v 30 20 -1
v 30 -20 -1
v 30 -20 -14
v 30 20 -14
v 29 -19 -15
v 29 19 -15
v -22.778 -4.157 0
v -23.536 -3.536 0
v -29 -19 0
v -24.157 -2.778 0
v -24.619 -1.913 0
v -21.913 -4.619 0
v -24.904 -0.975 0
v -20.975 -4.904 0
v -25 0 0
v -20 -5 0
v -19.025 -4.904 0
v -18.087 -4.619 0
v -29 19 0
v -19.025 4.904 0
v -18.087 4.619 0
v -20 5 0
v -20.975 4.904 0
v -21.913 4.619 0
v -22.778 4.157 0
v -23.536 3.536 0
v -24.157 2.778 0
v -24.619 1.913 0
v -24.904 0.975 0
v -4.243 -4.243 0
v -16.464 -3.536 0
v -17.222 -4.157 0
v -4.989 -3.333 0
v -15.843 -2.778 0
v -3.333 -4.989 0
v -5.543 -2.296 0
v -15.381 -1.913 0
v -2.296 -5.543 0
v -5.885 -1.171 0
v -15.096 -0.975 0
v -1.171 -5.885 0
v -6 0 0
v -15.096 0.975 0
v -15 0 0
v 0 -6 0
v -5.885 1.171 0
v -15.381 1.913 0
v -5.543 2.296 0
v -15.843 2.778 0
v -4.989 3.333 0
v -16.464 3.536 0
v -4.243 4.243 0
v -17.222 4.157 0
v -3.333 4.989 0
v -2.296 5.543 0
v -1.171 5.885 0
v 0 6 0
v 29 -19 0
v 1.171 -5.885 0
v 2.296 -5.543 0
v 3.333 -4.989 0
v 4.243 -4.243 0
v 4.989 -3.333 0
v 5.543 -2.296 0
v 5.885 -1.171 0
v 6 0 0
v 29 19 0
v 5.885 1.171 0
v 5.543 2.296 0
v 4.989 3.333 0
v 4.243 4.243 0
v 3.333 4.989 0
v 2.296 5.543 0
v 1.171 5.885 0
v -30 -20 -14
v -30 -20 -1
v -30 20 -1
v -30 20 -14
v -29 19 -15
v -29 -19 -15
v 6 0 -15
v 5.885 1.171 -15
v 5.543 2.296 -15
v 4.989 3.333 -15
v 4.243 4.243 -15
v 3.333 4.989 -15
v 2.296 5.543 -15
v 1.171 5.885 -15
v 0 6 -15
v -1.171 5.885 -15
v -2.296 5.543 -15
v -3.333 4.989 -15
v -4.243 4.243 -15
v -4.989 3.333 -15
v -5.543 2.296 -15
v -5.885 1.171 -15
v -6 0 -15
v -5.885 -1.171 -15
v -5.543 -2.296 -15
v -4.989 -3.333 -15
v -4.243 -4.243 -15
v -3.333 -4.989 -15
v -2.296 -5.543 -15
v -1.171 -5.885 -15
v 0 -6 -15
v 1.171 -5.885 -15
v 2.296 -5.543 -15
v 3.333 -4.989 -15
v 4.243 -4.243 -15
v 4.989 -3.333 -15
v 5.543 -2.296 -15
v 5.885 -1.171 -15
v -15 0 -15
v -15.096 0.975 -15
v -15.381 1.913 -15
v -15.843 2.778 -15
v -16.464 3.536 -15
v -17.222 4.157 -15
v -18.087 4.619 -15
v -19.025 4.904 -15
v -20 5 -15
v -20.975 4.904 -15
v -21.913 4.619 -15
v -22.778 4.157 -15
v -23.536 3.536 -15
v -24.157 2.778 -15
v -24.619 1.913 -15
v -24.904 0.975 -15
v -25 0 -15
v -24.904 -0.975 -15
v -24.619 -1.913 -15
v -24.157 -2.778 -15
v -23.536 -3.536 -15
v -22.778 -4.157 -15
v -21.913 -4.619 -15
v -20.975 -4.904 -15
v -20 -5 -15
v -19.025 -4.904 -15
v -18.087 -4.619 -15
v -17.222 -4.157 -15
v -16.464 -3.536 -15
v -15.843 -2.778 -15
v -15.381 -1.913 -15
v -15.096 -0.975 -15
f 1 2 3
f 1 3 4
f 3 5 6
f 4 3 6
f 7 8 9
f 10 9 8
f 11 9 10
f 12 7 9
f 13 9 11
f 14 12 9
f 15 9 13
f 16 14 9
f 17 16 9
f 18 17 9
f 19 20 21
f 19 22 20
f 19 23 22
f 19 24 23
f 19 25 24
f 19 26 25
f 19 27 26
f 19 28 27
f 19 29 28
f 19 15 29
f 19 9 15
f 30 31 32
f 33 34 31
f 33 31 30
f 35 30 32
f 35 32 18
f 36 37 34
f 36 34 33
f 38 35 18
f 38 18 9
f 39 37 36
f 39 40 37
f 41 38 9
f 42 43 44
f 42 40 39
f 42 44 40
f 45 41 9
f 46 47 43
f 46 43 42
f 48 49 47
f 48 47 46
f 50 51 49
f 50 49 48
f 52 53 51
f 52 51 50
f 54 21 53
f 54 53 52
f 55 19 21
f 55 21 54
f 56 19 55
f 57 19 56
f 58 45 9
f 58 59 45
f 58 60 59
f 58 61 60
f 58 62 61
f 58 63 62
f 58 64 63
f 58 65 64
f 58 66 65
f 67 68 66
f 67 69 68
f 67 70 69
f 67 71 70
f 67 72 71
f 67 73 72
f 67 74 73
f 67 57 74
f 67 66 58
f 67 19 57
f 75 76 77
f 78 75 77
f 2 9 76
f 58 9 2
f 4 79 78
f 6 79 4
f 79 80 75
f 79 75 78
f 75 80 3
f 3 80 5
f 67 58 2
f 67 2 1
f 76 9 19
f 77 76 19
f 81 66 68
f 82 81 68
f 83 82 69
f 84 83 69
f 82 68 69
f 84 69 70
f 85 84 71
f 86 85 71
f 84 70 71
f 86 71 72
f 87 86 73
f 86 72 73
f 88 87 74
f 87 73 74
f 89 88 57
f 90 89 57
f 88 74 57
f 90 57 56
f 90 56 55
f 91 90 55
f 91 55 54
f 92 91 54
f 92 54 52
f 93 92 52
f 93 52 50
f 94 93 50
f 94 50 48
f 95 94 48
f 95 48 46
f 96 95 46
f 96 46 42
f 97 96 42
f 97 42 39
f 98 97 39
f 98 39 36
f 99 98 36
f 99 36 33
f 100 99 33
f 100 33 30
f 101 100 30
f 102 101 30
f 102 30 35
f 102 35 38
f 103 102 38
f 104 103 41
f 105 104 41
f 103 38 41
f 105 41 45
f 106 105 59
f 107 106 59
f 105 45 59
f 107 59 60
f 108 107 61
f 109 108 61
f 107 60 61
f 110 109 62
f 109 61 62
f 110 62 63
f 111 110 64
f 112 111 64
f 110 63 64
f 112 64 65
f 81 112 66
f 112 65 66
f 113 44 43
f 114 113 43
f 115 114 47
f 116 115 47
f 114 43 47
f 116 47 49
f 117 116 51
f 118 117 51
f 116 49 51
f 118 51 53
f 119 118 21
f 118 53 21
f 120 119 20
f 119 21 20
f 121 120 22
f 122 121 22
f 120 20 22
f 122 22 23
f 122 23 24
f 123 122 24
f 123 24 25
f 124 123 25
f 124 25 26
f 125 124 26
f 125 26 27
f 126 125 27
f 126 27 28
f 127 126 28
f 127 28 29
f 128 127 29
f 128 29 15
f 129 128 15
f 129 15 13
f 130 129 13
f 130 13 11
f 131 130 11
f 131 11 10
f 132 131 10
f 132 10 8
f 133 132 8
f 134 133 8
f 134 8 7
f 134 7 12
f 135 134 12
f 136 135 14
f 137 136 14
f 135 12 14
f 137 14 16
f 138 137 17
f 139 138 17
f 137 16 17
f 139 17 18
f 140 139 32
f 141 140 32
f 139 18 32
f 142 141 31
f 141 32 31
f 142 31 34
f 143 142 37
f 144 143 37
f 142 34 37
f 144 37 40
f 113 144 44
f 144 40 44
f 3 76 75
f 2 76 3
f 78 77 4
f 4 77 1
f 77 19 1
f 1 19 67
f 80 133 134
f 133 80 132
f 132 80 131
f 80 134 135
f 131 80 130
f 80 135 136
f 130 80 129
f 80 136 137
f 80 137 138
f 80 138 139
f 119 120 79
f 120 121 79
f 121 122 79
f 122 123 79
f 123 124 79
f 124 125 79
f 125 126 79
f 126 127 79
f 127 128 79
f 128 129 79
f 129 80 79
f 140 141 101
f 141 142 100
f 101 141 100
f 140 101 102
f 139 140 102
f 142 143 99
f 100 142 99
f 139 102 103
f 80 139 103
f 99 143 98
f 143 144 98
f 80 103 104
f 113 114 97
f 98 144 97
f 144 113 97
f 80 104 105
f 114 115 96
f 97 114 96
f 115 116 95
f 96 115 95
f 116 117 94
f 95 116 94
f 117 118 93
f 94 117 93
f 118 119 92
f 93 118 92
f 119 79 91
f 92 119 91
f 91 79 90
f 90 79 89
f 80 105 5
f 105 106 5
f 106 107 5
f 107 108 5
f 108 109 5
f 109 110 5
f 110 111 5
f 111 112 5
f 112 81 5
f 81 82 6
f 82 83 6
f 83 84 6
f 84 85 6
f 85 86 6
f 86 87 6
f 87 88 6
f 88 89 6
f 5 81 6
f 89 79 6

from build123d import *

# Parameters (mm, degrees)
F0_W     = 60
F0_H     = 40
F1_DEPTH = 15
F2_SIZE  = 1
F3_R     = 5
F3_R_2   = 6
F4_DEPTH = 15.001


with BuildPart() as f1:
    # F0 (on Top) → F1 (new body)
    with BuildSketch(Plane.XY):
        Rectangle(F0_W, F0_H)
    extrude(amount=-F1_DEPTH)

    # F2
    f2_edges = [f1.edges().sort_by_distance(p)[0] for p in [
        (30, 0, 0),
        (0, 20, 0),
        (-30, 0, 0),
        (0, -20, 0),
        (30, 0, -15),
        (0, 20, -15),
        (-30, 0, -15),
        (0, -20, -15),
    ]]
    chamfer(f2_edges, length=F2_SIZE)

    # F3 (on face) → F4 (cut, through all)
    with BuildSketch(Plane.XY):
        with Locations((-20, 0)):
            Circle(F3_R)
        Circle(F3_R_2)
    extrude(amount=-F4_DEPTH, mode=Mode.SUBTRACT)


solid = f1.part
